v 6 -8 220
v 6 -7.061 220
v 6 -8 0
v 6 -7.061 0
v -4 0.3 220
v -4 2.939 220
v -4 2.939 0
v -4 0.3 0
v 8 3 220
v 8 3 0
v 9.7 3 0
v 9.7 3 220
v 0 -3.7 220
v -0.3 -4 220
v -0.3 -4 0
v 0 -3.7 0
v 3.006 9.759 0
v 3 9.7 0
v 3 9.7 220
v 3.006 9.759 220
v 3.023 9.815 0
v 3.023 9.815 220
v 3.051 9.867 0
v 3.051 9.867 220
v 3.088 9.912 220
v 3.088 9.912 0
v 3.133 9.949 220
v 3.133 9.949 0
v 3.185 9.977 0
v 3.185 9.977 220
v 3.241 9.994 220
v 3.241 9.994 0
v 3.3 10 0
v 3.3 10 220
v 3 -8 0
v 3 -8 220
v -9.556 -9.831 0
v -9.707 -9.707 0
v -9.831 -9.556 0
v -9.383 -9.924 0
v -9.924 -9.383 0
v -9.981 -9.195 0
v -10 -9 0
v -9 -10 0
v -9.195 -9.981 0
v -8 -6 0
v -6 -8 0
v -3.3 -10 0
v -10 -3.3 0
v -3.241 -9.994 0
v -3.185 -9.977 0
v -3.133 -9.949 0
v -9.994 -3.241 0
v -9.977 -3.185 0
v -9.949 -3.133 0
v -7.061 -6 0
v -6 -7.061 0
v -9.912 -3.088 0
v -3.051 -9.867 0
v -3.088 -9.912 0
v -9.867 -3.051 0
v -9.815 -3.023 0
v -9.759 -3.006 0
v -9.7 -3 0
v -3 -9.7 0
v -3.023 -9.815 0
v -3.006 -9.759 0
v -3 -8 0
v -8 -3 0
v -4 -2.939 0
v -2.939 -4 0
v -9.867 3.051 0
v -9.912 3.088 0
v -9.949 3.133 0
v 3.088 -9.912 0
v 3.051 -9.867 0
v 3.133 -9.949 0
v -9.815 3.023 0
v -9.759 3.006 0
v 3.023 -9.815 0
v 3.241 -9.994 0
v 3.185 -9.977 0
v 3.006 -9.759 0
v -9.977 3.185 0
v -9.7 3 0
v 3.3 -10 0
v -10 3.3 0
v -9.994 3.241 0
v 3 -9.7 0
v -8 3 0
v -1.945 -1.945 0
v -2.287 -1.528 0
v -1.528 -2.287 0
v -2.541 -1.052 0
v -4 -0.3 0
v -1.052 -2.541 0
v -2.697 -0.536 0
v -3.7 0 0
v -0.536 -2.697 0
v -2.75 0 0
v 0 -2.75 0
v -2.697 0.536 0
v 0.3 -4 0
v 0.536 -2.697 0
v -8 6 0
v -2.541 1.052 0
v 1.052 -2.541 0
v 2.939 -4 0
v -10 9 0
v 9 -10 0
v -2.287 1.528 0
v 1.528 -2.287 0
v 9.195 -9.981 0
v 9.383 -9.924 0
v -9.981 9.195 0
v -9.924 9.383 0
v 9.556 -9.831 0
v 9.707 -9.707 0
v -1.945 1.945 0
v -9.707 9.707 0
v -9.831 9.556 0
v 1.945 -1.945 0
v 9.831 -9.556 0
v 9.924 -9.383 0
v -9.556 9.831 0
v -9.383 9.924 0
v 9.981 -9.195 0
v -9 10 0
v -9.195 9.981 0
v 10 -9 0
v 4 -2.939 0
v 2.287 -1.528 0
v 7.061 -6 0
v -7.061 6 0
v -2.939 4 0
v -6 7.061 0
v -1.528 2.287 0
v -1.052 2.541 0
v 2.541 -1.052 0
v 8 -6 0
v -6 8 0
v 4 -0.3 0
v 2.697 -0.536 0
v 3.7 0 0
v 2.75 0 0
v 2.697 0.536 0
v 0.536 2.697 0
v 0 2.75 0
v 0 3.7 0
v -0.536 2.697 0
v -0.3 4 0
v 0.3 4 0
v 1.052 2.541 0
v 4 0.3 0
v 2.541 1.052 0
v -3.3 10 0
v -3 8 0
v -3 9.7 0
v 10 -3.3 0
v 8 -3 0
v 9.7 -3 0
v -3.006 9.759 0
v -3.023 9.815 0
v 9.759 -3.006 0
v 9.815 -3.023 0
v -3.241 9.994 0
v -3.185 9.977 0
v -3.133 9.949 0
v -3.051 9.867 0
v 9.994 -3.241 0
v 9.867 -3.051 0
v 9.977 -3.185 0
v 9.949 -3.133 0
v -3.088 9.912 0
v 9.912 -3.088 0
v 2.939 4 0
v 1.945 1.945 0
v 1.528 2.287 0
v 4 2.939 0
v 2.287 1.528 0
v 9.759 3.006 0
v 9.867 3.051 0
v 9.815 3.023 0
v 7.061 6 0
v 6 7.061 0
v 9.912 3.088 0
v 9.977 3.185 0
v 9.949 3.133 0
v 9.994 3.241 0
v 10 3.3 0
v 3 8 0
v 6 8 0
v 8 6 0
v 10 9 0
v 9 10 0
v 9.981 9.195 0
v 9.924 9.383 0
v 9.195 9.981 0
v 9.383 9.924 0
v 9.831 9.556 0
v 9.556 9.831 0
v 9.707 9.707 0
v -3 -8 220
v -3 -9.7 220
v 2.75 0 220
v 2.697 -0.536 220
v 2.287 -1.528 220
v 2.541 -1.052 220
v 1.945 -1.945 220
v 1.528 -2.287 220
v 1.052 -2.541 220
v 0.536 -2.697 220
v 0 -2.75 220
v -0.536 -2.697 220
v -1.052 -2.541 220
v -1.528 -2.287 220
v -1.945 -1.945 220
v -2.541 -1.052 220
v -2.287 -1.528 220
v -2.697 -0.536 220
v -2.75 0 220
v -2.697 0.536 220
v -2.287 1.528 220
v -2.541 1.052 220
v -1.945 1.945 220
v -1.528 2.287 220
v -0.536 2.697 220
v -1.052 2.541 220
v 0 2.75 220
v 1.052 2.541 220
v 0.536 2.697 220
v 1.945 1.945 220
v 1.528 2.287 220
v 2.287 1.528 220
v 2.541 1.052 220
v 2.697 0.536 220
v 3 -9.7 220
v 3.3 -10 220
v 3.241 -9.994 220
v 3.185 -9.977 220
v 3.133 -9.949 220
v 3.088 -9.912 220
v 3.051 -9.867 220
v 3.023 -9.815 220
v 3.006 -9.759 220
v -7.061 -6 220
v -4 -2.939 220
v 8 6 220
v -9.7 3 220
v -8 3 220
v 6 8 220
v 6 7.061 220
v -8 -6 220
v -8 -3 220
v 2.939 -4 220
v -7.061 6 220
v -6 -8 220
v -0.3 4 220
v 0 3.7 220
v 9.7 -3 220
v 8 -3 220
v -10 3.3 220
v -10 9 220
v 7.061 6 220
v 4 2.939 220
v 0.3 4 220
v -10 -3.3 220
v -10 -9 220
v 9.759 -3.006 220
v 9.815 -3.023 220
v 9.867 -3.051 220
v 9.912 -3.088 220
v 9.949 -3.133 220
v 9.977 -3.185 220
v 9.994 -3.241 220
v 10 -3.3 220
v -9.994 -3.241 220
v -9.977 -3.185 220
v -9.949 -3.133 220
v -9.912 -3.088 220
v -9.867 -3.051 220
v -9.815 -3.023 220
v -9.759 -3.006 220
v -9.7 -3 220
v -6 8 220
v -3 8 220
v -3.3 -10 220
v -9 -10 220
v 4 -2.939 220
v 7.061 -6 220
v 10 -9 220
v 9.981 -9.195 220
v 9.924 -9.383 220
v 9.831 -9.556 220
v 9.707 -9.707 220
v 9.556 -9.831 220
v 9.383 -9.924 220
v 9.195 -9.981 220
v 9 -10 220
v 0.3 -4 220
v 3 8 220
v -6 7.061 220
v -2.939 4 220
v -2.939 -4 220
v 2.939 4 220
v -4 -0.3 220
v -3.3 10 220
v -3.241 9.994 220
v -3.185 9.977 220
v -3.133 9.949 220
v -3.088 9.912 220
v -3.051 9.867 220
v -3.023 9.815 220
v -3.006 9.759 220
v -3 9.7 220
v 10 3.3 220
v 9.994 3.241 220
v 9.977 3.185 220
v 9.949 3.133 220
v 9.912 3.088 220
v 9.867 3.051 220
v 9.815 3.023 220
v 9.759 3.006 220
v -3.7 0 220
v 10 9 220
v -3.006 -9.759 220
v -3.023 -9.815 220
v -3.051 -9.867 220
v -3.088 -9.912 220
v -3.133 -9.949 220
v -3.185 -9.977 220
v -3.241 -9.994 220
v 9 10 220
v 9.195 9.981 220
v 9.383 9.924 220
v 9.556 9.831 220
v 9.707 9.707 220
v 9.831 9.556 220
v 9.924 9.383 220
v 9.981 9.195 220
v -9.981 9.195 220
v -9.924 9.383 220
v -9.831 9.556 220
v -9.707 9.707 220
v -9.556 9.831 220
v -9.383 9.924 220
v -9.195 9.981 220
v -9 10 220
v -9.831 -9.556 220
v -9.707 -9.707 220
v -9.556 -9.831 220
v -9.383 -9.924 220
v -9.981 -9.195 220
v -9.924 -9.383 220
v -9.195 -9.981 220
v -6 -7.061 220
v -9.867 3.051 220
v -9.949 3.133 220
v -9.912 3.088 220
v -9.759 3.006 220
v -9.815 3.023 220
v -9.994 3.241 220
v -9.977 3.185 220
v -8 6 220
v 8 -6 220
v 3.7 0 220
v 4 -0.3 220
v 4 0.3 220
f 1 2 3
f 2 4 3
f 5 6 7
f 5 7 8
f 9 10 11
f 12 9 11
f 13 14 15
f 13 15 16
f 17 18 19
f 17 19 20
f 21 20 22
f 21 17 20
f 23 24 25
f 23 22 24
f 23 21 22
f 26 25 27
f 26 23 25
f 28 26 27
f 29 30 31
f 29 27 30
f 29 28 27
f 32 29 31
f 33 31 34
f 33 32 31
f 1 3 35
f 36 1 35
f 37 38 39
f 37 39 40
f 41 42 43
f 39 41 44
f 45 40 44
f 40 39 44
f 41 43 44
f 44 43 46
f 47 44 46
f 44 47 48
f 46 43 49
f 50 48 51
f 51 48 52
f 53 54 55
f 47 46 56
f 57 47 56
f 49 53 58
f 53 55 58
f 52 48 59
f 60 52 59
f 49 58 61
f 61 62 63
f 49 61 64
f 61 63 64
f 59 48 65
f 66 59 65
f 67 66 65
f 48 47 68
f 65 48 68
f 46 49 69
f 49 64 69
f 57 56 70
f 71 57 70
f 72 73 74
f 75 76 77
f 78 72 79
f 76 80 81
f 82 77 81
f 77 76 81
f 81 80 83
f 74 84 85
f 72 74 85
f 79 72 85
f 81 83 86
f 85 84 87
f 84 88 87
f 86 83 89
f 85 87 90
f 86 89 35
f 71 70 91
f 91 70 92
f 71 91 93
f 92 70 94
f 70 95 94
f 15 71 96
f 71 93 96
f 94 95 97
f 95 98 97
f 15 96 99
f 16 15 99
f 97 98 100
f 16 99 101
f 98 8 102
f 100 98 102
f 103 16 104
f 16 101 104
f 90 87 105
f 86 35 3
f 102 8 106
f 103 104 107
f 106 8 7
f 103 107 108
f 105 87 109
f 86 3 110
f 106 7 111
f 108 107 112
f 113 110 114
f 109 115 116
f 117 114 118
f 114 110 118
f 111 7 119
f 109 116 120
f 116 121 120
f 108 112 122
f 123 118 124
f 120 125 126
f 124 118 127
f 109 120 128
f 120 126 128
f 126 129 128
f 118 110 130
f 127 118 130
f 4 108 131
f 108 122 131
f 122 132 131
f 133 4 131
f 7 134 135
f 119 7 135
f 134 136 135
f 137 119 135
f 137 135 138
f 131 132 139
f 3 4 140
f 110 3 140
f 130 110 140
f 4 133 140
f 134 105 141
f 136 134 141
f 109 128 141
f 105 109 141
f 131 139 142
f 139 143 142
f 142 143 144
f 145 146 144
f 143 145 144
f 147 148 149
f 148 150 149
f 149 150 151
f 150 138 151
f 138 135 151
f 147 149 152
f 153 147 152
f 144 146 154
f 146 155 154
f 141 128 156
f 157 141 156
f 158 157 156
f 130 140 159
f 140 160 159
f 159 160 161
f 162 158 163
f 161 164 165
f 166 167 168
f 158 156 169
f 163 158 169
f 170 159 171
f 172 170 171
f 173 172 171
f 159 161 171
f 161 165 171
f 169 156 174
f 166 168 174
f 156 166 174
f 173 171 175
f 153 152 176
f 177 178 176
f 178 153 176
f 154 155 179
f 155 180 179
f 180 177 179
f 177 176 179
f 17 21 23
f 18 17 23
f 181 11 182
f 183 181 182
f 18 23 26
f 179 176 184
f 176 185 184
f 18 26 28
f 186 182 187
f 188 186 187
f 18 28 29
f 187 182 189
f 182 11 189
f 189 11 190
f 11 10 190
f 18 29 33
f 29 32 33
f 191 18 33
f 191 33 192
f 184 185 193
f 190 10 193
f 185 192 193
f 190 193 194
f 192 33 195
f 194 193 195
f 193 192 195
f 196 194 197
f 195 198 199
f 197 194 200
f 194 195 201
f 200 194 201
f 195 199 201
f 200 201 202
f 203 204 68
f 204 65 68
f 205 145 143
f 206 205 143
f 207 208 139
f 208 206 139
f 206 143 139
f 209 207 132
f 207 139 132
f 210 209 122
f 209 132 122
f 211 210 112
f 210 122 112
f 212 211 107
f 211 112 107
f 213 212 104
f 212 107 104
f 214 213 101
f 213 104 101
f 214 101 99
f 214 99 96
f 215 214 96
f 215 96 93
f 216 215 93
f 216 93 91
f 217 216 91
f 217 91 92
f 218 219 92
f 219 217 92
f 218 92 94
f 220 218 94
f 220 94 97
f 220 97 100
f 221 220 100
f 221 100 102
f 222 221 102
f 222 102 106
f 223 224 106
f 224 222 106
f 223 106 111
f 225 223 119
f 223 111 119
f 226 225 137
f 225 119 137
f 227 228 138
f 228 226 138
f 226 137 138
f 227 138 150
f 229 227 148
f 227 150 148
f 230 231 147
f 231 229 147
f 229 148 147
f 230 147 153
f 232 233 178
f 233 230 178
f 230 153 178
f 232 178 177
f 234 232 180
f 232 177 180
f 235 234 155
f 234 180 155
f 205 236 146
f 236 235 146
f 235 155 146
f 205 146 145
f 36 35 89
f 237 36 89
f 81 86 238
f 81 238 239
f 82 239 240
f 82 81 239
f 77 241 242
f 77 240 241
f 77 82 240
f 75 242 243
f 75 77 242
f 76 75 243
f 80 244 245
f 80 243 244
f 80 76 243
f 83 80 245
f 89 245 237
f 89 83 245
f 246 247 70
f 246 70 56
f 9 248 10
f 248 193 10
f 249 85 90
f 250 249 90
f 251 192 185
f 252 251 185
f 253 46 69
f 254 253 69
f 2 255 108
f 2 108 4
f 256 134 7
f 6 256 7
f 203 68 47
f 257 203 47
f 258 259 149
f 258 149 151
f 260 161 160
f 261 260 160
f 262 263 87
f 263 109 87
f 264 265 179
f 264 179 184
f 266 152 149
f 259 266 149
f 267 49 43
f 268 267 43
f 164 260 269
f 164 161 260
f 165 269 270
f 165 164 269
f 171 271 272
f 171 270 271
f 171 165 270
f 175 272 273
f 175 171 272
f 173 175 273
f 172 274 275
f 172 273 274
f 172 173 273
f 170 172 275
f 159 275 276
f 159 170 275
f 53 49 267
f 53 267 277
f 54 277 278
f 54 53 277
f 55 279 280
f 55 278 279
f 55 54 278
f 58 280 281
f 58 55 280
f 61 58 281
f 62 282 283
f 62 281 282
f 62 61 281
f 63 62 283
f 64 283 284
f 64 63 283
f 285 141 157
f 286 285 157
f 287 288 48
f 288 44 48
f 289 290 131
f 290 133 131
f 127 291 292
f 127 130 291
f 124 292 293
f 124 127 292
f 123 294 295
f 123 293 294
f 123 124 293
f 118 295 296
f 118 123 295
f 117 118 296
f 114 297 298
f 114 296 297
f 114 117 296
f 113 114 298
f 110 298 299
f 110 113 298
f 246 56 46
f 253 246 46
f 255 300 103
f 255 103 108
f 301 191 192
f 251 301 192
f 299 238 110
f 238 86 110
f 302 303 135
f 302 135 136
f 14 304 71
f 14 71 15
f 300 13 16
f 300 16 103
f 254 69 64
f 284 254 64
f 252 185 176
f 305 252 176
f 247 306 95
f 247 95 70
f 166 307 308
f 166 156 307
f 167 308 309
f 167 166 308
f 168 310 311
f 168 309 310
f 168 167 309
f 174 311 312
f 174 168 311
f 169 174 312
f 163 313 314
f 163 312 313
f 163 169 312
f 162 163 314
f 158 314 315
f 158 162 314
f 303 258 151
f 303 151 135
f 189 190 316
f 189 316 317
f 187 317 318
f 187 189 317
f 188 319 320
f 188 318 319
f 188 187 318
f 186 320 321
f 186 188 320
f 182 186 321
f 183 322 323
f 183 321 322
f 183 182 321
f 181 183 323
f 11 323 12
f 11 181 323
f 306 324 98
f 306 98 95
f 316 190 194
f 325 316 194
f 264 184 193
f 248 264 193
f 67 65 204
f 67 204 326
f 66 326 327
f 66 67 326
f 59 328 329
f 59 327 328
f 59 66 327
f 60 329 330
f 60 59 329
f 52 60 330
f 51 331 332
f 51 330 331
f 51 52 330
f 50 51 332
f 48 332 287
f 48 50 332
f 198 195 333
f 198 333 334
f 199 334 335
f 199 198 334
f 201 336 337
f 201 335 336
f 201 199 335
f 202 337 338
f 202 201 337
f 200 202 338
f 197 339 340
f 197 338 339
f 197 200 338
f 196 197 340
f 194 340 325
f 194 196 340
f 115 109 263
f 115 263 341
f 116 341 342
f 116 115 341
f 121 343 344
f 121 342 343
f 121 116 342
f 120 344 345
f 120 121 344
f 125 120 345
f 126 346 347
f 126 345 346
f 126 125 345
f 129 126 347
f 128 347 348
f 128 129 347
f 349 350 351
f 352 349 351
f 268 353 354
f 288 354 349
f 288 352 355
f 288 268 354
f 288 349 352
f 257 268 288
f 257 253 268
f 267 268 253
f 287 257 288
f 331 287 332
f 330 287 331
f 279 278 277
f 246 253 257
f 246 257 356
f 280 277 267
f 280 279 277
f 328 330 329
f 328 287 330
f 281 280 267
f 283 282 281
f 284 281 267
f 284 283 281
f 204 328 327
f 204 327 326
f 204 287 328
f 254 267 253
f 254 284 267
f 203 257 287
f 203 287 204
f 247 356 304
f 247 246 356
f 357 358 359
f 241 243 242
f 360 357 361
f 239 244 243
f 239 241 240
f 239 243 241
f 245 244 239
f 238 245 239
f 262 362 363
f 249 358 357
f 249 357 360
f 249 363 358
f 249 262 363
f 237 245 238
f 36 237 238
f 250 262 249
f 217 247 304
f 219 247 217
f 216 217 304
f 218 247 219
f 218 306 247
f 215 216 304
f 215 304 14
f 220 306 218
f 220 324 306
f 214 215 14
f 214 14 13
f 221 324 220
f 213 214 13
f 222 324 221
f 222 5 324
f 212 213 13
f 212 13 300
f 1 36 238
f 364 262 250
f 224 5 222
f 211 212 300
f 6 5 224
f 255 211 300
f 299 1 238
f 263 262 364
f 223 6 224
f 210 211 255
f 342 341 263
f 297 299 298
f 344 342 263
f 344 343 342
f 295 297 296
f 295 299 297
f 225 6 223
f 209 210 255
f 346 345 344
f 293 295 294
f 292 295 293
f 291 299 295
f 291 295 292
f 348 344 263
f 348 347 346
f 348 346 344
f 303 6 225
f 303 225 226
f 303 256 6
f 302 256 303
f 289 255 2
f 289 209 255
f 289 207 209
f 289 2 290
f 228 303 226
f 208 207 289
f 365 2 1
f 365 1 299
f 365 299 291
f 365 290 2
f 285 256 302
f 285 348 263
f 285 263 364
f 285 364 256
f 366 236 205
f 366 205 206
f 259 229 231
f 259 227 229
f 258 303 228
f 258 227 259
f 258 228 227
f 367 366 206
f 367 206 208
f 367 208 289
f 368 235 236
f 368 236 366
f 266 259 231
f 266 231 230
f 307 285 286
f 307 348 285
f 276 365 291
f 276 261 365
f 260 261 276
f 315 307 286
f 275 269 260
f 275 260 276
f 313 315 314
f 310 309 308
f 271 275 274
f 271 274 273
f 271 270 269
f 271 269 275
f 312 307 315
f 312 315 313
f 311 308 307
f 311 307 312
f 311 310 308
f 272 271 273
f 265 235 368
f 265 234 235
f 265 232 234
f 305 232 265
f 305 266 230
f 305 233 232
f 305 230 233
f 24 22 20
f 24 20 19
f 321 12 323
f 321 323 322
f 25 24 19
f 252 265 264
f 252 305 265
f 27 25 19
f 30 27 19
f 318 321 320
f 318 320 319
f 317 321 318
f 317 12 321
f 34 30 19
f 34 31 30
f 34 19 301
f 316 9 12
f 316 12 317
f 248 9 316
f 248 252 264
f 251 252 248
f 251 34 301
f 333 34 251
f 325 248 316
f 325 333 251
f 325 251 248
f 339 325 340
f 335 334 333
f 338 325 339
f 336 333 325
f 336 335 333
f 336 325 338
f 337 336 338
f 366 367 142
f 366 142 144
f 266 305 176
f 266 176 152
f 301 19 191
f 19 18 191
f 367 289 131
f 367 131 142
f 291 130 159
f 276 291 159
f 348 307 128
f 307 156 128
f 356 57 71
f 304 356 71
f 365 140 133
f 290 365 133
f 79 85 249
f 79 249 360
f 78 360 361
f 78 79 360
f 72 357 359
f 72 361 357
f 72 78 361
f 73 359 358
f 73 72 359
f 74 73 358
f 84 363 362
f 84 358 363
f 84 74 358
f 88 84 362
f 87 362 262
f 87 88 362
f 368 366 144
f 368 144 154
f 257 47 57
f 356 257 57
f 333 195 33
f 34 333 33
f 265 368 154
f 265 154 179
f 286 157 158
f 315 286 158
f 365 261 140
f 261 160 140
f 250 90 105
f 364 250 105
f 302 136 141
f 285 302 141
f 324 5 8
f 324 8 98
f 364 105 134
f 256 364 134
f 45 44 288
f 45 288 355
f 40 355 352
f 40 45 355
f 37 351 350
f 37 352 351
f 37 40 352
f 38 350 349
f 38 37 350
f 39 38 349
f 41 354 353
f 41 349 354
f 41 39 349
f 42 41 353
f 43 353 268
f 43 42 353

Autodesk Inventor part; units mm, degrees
ref_plane "Startebene" through (0, 0, 0) normal (0, 0, 1) x (1, 0, 0)
ref_plane "Endebene" through (0, 0, 320) normal (0, 0, 1) x (1, 0, 0)
ref_plane "Startebene1" through (0, 0, 0) normal (0, 0, 1) x (1, 0, 0)
ref_plane "Endebene1" through (0, 0, 220) normal (0, 0, 1) x (1, 0, 0)
ref_plane "Startebene2" through (0, 0, 0) normal (0, 0, 1) x (1, 0, 0)
ref_plane "Endebene2" through (0, 0, 220) normal (0, 0, 1) x (1, 0, 0)
sketch "Skizze" plane through (0, 0, 0) normal (0, 0, 1) x (1, 0, 0)
  line L0 (-10, 9) -> (-10, 3.3)
  arc A0 (-10, 3.3) -> (-9.7, 3) centre (-9.7, 3.3) ccw
  line L1 (-9.7, 3) -> (-8, 3)
  line L2 (-8, 3) -> (-8, 6)
  line L3 (-8, 6) -> (-7.0607, 6)
  line L4 (-7.0607, 6) -> (-4, 2.9393)
  line L5 (-4, 2.9393) -> (-4, 0.3)
  line L6 (-4, 0.3) -> (-3.7, 0)
  line L7 (-3.7, 0) -> (-4, -0.3)
  line L8 (-4, -0.3) -> (-4, -2.9393)
  line L9 (-4, -2.9393) -> (-7.0607, -6)
  line L10 (-7.0607, -6) -> (-8, -6)
  line L11 (-8, -6) -> (-8, -3)
  line L12 (-8, -3) -> (-9.7, -3)
  arc A1 (-9.7, -3) -> (-10, -3.3) centre (-9.7, -3.3) ccw
  line L13 (-10, -3.3) -> (-10, -9)
  arc A2 (-10, -9) -> (-9, -10) centre (-9, -9) ccw
  line L14 (-9, -10) -> (-3.3, -10)
  arc A3 (-3.3, -10) -> (-3, -9.7) centre (-3.3, -9.7) ccw
  line L15 (-3, -9.7) -> (-3, -8)
  line L16 (-3, -8) -> (-6, -8)
  line L17 (-6, -8) -> (-6, -7.0607)
  line L18 (-6, -7.0607) -> (-2.9393, -4)
  line L19 (-2.9393, -4) -> (-0.3, -4)
  line L20 (-0.3, -4) -> (0, -3.7)
  line L21 (0, -3.7) -> (0.3, -4)
  line L22 (0.3, -4) -> (2.9393, -4)
  line L23 (2.9393, -4) -> (6, -7.0607)
  line L24 (6, -7.0607) -> (6, -8)
  line L25 (6, -8) -> (3, -8)
  line L26 (3, -8) -> (3, -9.7)
  arc A4 (3, -9.7) -> (3.3, -10) centre (3.3, -9.7) ccw
  line L27 (3.3, -10) -> (9, -10)
  arc A5 (9, -10) -> (10, -9) centre (9, -9) ccw
  line L28 (10, -9) -> (10, -3.3)
  arc A6 (10, -3.3) -> (9.7, -3) centre (9.7, -3.3) ccw
  line L29 (9.7, -3) -> (8, -3)
  line L30 (8, -3) -> (8, -6)
  line L31 (8, -6) -> (7.0607, -6)
  line L32 (7.0607, -6) -> (4, -2.9393)
  line L33 (4, -2.9393) -> (4, -0.3)
  line L34 (4, -0.3) -> (3.7, 0)
  line L35 (3.7, 0) -> (4, 0.3)
  line L36 (4, 0.3) -> (4, 2.9393)
  line L37 (4, 2.9393) -> (7.0607, 6)
  line L38 (7.0607, 6) -> (8, 6)
  line L39 (8, 6) -> (8, 3)
  line L40 (8, 3) -> (9.7, 3)
  arc A7 (9.7, 3) -> (10, 3.3) centre (9.7, 3.3) ccw
  line L41 (10, 3.3) -> (10, 9)
  arc A8 (10, 9) -> (9, 10) centre (9, 9) ccw
  line L42 (9, 10) -> (3.3, 10)
  arc A9 (3.3, 10) -> (3, 9.7) centre (3.3, 9.7) ccw
  line L43 (3, 9.7) -> (3, 8)
  line L44 (3, 8) -> (6, 8)
  line L45 (6, 8) -> (6, 7.0607)
  line L46 (6, 7.0607) -> (2.9393, 4)
  line L47 (2.9393, 4) -> (0.3, 4)
  line L48 (0.3, 4) -> (0, 3.7)
  line L49 (0, 3.7) -> (-0.3, 4)
  line L50 (-0.3, 4) -> (-2.9393, 4)
  line L51 (-2.9393, 4) -> (-6, 7.0607)
  line L52 (-6, 7.0607) -> (-6, 8)
  line L53 (-6, 8) -> (-3, 8)
  line L54 (-3, 8) -> (-3, 9.7)
  arc A10 (-3, 9.7) -> (-3.3, 10) centre (-3.3, 9.7) ccw
  line L55 (-3.3, 10) -> (-9, 10)
  arc A11 (-9, 10) -> (-10, 9) centre (-9, 9) ccw
  circle A12 centre (0, 0) radius 2.75
  dimension "d2" = 5.5
  dimension "d3" = 10
  dimension "d4" = 10
  dimension "d5" = 5.7
  dimension "d6" = 5.7
  dimension "d7" = 1.7
  dimension "d8" = 3
  dimension "d9" = 0.3
  dimension "d10" = 90
  dimension "d11" = 45
  dimension "d12" = 45
  dimension "d13" = 45
  dimension "d14" = 90
  dimension "d15" = 90
  dimension "d16" = 45
  dimension "d17" = 45
  dimension "d18" = 45
  dimension "d19" = 45
  dimension "d20" = 90
  dimension "d21" = 90
  dimension "d22" = 45
  dimension "d23" = 45
  dimension "d24" = 90
  dimension "d25" = 90
  dimension "d26" = 90
  dimension "d27" = 90
  dimension "d28" = 90
  dimension "d29" = 90
  dimension "d30" = 90
  dimension "d31" = 90
  dimension "d32" = 90
  dimension "d33" = 90
  dimension "d34" = 90
  dimension "d35" = 90
  dimension "d36" = 90
  dimension "d37" = 90
  dimension "d38" = 90
  dimension "d39" = 4
  dimension "d40" = 6
  dimension "d41" = 13
  dimension "d42" = 14
  dimension "d43" = 16
  dimension "d44" = 18
  dimension "d45" = 3
  dimension "d46" = 9
  dimension "d47" = 7
  dimension "d48" = 1
  dimension "d49" = 7
  dimension "d50" = 1.5
  dimension "d51" = 1.8663
  dimension "d52" = 3.3663
  dimension "d53" = 1.5
  dimension "d54" = 1.8663
  dimension "d55" = 3.3663
  dimension "d56" = 4
  dimension "d57" = 10.8187
  dimension "d58" = 1.9092
  dimension "d59" = 5
  dimension "d60" = 13
  dimension "d61" = 13
  dimension "d62" = 16.0513
  dimension "d63" = 3.3234
  dimension "d64" = 14
  dimension "d65" = 12.685
extrude "Körper" add sketch "Skizze" along normal up to surface (220 mm away) from surface at 0
sketch "Skizze13" plane through (0, 0, 0) normal (0, 0, 1) x (1, 0, 0)
  line L0 (0, 0) -> (10, 0)
ref_plane "Arbeitsebene12" through (0, 0, 0) normal (0, -1, 0) x (1, 0, 0)
sketch "Skizze14" plane through (0, 0, 0) normal (0, -1, 0) x (1, 0, 0)
  line L0 (-2, 0) -> (12, 0)
  line L1 (-2, 220) -> (12, 220)
  dimension "d80" = 220
equation "\"G_OFFSET_START\" = 0"
equation "\"G_OFFSET_END\" = 0"
equation "\"G_L\" = d80"
equation "\"G_OFFSET_START1\" = 0"
equation "\"G_OFFSET_END1\" = 0"
equation "\"G_OFFSET_START2\" = 0"
equation "\"G_OFFSET_END2\" = 0"
properties part number "Alu Profil 20x20 - AP2020" material "Aluminium 6061"
